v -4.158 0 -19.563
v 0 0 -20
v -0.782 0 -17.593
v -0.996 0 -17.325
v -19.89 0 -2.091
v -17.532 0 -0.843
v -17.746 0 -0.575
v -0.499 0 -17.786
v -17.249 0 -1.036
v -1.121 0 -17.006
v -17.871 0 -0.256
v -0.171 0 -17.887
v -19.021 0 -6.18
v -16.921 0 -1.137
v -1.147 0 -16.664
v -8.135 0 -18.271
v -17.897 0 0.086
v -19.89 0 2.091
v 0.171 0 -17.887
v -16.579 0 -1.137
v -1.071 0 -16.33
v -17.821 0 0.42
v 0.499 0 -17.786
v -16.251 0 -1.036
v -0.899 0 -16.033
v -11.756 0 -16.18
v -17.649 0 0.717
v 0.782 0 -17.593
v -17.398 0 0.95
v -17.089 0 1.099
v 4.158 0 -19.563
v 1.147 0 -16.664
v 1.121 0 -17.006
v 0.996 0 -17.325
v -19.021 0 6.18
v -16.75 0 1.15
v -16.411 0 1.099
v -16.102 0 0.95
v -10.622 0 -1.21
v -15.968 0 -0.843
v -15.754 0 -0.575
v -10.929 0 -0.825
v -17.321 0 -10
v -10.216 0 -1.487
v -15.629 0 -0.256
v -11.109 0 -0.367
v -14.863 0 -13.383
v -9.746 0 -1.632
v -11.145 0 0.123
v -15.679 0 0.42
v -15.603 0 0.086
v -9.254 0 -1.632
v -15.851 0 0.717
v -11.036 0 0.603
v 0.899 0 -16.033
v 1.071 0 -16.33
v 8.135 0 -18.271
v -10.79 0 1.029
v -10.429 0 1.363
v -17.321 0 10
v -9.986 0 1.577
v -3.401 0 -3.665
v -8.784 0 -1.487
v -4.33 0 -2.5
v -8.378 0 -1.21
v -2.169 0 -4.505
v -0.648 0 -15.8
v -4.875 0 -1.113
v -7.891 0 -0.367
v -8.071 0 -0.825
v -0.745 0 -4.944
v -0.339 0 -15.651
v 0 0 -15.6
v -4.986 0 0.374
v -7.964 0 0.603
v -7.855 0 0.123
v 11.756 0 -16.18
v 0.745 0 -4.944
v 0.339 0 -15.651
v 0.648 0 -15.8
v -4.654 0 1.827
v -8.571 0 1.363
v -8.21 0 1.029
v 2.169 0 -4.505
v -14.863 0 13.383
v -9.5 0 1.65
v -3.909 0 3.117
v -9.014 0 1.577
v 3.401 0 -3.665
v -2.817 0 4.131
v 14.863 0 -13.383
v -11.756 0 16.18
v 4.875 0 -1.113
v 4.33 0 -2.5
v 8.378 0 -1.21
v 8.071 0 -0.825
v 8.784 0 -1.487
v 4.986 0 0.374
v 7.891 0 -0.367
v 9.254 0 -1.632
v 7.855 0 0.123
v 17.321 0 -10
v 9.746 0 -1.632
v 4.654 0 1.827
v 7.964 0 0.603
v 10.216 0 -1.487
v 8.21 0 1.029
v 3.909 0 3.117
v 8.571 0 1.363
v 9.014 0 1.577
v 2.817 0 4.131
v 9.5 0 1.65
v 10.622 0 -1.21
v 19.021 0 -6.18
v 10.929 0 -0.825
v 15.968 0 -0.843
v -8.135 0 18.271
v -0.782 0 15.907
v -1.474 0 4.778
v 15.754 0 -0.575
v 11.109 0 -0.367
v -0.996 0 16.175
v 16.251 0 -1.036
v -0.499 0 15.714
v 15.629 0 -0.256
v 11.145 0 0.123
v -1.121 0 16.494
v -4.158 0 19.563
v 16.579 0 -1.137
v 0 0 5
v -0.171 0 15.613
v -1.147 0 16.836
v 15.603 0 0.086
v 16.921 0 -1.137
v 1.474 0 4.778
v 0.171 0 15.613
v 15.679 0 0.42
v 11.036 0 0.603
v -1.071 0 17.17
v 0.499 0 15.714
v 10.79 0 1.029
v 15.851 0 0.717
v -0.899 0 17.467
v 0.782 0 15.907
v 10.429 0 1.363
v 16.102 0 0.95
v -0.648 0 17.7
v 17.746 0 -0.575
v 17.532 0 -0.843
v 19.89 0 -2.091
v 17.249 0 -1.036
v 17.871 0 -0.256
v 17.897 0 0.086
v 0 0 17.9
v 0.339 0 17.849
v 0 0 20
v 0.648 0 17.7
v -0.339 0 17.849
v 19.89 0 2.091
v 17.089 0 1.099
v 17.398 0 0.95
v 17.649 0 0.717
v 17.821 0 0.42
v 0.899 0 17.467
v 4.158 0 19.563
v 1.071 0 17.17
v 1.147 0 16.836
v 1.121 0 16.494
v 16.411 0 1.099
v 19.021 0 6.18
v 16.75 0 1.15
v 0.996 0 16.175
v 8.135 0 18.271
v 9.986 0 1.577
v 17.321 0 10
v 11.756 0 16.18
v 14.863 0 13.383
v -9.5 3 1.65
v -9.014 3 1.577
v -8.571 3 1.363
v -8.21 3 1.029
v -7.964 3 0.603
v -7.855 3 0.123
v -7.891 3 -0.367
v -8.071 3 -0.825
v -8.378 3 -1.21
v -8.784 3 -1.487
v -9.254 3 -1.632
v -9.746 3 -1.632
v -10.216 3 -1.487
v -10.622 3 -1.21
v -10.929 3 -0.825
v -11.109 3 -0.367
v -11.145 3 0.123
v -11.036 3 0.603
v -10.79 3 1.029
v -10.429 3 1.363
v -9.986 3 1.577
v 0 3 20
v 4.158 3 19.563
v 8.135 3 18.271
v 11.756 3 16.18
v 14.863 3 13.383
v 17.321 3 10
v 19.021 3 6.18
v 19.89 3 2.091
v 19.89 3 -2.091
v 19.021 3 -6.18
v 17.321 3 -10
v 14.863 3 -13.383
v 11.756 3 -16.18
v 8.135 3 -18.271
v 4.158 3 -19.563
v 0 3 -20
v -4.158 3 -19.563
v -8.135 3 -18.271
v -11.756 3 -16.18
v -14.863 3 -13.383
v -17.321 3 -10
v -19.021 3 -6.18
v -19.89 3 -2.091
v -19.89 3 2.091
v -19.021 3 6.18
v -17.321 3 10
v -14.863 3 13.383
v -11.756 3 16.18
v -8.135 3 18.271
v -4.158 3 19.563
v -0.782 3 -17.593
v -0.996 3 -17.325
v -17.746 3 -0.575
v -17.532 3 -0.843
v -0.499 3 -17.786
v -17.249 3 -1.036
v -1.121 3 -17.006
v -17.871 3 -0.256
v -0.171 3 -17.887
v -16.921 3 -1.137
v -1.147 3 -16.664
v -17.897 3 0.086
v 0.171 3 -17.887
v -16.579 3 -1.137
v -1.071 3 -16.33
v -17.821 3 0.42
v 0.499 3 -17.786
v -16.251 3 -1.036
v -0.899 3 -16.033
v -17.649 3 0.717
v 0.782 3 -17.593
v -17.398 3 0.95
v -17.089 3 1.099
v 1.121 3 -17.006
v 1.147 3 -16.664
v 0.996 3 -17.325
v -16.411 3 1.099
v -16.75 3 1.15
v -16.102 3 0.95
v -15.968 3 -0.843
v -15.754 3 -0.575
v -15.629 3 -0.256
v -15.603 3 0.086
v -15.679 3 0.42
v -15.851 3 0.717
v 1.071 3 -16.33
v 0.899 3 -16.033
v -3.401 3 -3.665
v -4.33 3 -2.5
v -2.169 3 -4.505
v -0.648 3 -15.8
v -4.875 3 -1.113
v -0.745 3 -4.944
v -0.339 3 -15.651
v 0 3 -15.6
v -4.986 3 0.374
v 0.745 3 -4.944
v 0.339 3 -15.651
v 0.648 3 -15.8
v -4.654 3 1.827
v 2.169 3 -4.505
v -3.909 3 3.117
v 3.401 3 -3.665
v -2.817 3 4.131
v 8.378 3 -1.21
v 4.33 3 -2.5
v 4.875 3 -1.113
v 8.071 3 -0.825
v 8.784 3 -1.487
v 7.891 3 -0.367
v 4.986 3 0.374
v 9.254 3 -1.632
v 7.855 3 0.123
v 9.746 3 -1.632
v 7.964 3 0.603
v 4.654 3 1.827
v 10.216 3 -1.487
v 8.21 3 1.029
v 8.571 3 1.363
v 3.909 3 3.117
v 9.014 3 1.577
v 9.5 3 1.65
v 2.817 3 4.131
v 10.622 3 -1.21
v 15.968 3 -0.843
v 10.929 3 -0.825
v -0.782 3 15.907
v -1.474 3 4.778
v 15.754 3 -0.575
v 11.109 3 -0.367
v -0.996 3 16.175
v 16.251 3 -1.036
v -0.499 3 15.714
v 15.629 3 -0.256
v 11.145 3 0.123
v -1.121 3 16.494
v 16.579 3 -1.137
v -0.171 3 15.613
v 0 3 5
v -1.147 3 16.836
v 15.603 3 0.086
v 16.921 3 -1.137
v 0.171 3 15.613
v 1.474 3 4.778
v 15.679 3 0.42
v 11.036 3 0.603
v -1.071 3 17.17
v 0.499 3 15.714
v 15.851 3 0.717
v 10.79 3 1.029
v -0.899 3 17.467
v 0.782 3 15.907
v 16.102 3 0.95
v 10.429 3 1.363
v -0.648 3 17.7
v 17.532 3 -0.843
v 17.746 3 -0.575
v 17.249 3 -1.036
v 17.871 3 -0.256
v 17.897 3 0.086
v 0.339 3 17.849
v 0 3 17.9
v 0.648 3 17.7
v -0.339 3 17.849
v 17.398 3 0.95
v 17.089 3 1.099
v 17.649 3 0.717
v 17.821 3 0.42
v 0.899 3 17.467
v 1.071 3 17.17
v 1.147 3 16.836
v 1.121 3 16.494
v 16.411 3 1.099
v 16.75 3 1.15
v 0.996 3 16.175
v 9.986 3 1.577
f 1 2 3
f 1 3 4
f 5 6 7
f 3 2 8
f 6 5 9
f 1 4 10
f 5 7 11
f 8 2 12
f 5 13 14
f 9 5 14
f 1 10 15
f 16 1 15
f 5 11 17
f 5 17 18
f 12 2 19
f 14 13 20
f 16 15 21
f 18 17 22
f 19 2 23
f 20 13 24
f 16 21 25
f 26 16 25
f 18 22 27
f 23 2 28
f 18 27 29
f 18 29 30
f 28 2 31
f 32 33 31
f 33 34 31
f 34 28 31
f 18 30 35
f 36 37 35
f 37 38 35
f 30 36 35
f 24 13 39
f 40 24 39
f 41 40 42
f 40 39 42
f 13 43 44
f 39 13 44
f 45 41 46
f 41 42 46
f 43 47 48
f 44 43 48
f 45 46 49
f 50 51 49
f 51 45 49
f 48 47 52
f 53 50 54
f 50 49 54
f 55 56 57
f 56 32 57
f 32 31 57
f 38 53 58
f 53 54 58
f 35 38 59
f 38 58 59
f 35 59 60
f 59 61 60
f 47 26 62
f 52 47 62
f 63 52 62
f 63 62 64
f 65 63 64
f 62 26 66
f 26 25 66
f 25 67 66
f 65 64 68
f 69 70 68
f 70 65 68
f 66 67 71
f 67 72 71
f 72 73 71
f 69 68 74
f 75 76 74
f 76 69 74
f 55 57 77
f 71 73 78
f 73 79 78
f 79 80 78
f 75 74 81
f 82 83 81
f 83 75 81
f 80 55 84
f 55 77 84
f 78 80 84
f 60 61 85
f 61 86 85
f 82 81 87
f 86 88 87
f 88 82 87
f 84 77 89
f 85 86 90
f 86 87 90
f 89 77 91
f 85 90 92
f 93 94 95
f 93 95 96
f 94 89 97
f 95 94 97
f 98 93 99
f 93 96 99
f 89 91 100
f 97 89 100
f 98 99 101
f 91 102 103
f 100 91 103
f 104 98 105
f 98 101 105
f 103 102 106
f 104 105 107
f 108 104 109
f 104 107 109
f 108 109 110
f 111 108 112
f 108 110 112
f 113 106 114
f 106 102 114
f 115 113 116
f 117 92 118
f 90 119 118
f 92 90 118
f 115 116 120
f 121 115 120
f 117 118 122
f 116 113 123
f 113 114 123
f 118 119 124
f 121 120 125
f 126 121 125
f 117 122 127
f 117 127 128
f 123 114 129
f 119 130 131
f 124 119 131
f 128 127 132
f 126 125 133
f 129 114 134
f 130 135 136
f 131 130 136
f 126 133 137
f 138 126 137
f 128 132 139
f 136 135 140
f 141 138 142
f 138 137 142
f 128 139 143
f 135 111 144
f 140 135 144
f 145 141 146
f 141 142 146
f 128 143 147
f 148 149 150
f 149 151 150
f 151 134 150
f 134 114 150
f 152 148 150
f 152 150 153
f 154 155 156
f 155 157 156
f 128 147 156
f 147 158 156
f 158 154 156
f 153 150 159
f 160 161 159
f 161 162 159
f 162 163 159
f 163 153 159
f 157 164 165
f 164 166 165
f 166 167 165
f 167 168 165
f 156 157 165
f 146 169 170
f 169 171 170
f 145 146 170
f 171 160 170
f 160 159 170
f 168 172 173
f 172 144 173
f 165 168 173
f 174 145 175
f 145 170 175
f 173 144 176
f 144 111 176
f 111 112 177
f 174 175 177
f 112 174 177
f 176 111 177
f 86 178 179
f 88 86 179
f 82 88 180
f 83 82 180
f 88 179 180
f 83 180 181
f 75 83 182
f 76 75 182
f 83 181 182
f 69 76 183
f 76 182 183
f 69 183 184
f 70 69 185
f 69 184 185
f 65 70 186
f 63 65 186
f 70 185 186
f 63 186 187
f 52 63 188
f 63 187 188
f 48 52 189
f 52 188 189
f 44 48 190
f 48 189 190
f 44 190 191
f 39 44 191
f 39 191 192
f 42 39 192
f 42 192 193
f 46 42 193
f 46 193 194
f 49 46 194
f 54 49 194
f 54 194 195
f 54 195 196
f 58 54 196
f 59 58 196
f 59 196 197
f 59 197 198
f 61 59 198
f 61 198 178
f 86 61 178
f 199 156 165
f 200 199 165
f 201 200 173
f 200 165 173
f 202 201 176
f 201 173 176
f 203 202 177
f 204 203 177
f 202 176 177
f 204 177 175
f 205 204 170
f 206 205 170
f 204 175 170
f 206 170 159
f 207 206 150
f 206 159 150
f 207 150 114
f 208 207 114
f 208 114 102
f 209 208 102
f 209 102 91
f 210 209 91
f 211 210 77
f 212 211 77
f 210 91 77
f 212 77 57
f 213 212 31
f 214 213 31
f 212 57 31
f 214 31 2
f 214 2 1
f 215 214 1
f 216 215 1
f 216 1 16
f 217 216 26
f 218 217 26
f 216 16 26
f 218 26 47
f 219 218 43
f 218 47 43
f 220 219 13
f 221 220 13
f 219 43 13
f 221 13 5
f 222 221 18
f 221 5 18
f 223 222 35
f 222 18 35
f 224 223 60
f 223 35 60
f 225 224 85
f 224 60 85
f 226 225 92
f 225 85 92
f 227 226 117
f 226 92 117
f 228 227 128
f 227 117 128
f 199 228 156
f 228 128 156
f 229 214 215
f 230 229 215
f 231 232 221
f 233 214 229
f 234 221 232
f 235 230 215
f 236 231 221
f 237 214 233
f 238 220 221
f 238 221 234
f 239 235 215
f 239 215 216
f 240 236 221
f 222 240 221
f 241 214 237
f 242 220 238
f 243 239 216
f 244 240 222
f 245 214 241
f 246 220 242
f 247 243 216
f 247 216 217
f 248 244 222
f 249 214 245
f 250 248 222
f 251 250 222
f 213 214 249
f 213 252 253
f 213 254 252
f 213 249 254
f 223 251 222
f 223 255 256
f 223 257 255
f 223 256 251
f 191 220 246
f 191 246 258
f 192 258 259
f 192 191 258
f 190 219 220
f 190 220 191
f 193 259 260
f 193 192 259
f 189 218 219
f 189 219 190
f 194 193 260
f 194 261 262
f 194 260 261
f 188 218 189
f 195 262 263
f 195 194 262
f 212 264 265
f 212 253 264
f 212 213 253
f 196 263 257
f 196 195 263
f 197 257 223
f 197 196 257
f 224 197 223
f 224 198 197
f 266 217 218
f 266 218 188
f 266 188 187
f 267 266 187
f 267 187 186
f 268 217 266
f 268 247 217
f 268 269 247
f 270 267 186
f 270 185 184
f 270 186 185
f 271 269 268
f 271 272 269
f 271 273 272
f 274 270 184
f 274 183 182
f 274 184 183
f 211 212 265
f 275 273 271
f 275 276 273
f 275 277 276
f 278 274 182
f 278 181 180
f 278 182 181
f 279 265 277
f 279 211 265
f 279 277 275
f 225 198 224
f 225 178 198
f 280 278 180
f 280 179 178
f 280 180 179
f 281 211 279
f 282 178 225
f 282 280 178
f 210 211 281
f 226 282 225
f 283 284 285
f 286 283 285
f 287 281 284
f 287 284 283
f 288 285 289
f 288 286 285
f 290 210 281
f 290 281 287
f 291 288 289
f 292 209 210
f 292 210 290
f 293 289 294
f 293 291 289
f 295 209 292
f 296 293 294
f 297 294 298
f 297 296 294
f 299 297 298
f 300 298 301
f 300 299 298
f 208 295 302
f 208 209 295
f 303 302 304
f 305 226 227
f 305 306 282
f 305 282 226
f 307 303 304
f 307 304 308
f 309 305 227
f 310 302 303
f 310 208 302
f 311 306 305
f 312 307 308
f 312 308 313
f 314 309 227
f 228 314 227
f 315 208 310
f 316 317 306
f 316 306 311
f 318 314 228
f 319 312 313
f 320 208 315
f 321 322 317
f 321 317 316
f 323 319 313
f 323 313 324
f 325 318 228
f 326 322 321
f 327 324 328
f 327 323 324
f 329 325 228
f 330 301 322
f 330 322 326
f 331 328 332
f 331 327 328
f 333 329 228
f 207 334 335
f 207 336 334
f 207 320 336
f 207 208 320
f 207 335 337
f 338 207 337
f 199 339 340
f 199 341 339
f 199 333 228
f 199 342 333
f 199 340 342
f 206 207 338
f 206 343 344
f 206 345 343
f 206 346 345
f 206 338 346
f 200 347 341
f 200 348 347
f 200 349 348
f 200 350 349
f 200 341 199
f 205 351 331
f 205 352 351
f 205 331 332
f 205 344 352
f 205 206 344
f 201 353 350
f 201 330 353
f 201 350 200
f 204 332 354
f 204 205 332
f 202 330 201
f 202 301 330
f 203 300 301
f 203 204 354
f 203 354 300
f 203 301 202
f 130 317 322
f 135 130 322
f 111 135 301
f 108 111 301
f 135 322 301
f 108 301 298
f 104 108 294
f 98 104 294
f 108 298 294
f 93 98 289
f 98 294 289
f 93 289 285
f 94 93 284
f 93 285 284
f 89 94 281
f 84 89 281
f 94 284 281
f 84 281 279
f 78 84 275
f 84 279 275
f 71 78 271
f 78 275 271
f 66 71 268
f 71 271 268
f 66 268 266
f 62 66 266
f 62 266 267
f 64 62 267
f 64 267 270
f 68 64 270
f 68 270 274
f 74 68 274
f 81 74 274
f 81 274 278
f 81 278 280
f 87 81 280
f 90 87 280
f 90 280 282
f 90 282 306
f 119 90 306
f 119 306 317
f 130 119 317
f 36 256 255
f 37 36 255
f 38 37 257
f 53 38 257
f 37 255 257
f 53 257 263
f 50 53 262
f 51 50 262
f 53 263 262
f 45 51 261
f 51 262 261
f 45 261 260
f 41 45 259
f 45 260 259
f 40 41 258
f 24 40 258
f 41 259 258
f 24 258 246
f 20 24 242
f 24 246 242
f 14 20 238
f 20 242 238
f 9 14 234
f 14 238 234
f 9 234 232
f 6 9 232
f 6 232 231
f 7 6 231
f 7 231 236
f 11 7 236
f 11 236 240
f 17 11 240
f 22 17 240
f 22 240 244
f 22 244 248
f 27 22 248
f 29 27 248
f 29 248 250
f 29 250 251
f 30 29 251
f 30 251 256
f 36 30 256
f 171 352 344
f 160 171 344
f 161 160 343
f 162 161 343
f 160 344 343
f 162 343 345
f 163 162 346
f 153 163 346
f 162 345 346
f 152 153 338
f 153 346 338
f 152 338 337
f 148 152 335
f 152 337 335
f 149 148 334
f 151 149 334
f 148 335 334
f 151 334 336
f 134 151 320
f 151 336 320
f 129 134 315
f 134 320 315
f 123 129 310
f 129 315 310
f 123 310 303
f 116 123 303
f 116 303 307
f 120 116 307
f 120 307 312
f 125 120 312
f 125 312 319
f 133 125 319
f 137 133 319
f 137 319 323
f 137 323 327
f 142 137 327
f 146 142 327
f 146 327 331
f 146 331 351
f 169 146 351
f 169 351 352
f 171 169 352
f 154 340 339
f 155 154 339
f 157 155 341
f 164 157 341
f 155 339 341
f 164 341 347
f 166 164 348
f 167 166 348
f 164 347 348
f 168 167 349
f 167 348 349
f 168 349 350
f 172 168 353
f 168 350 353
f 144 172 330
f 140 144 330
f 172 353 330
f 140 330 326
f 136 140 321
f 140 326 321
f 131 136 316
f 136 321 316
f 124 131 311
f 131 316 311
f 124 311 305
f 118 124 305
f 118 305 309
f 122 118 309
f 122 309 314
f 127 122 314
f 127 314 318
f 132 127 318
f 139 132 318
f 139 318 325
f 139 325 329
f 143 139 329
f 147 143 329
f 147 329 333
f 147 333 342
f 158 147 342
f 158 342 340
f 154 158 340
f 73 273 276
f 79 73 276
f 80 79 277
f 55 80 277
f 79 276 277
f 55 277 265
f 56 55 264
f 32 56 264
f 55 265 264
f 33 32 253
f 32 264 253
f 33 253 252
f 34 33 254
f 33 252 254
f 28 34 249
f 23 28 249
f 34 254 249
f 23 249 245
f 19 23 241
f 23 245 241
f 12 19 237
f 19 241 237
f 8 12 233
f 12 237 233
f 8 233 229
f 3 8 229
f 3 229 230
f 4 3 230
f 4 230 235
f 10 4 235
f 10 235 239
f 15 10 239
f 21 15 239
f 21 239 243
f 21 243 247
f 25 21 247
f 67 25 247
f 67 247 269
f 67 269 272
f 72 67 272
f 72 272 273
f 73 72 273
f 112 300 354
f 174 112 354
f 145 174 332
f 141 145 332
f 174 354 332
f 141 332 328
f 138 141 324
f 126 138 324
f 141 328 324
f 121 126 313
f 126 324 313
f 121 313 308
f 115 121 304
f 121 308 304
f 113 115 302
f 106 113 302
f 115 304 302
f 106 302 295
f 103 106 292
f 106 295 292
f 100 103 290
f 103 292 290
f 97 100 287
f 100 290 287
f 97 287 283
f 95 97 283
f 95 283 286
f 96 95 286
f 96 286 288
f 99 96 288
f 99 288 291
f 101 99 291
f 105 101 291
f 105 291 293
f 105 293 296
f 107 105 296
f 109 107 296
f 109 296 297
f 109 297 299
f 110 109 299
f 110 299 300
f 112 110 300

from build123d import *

# Parameters (mm, degrees)
SKETCH_1_R          = 20
EXTRUDE_1_DEPTH     = 3
CUT_EXTRUDE_1_REACH = 30.443
SKETCH_2_R          = 1.15
CUT_EXTRUDE_2_REACH = 30.443
SKETCH_3_R          = 1.65
SKETCH_3_R_2        = 5


with BuildPart() as part:
    # 草图1 → 凸台-拉伸1 (new body)
    with BuildSketch(Plane(origin=(0, 0, 0), x_dir=(1, 0, 0), z_dir=(0, 1, 0))):
        with Locations(Location((0, 0, 0), (0, 0, 270))):
            Circle(SKETCH_1_R)
    extrude(amount=EXTRUDE_1_DEPTH)

    # 草图2 → 切除-拉伸1 (cut, up to next)
    with BuildSketch(Plane(origin=(0, 3, 0), x_dir=(1, 0, 0), z_dir=(0, 1, 0)), mode=Mode.PRIVATE) as cut_extrude_1_sk1:
        with Locations(Location((0, 16.75, 0), (0, 0, 270))):
            Circle(SKETCH_2_R)
    cut_extrude_1_tool1 = extrude(cut_extrude_1_sk1.sketch, amount=-CUT_EXTRUDE_1_REACH, mode=Mode.PRIVATE) & part.part
    # 草图2 → 切除-拉伸1 (cut, up to next)
    with BuildSketch(Plane(origin=(0, 3, 0), x_dir=(1, 0, 0), z_dir=(0, 1, 0)), mode=Mode.PRIVATE) as cut_extrude_1_sk2:
        with Locations(Location((16.75, 0, 0), (0, 0, 270))):
            Circle(SKETCH_2_R)
    cut_extrude_1_tool2 = extrude(cut_extrude_1_sk2.sketch, amount=-CUT_EXTRUDE_1_REACH, mode=Mode.PRIVATE) & part.part
    # 草图2 → 切除-拉伸1 (cut, up to next)
    with BuildSketch(Plane(origin=(0, 3, 0), x_dir=(1, 0, 0), z_dir=(0, 1, 0)), mode=Mode.PRIVATE) as cut_extrude_1_sk3:
        with Locations(Location((0, -16.75, 0), (0, 0, 270))):
            Circle(SKETCH_2_R)
    cut_extrude_1_tool3 = extrude(cut_extrude_1_sk3.sketch, amount=-CUT_EXTRUDE_1_REACH, mode=Mode.PRIVATE) & part.part
    # 草图2 → 切除-拉伸1 (cut, up to next)
    with BuildSketch(Plane(origin=(0, 3, 0), x_dir=(1, 0, 0), z_dir=(0, 1, 0)), mode=Mode.PRIVATE) as cut_extrude_1_sk4:
        with Locations(Location((-16.75, 0, 0), (0, 0, 270))):
            Circle(SKETCH_2_R)
    cut_extrude_1_tool4 = extrude(cut_extrude_1_sk4.sketch, amount=-CUT_EXTRUDE_1_REACH, mode=Mode.PRIVATE) & part.part
    add(cut_extrude_1_tool1.solids().sort_by_distance((0, 3, -16.75))[0], mode=Mode.SUBTRACT)
    add(cut_extrude_1_tool2.solids().sort_by_distance((16.75, 3, 0))[0], mode=Mode.SUBTRACT)
    add(cut_extrude_1_tool3.solids().sort_by_distance((0, 3, 16.75))[0], mode=Mode.SUBTRACT)
    add(cut_extrude_1_tool4.solids().sort_by_distance((-16.75, 3, 0))[0], mode=Mode.SUBTRACT)

    # 草图3 → 切除-拉伸2 (cut, up to next)
    with BuildSketch(Plane(origin=(0, 3, 0), x_dir=(1, 0, 0), z_dir=(0, 1, 0)), mode=Mode.PRIVATE) as cut_extrude_2_sk1:
        with Locations(Location((-9.5, 0, 0), (0, 0, 270))):
            Circle(SKETCH_3_R)
    cut_extrude_2_tool1 = extrude(cut_extrude_2_sk1.sketch, amount=-CUT_EXTRUDE_2_REACH, mode=Mode.PRIVATE) & part.part
    # 草图3 → 切除-拉伸2 (cut, up to next)
    with BuildSketch(Plane(origin=(0, 3, 0), x_dir=(1, 0, 0), z_dir=(0, 1, 0)), mode=Mode.PRIVATE) as cut_extrude_2_sk2:
        with Locations(Location((9.5, 0, 0), (0, 0, 270))):
            Circle(SKETCH_3_R)
    cut_extrude_2_tool2 = extrude(cut_extrude_2_sk2.sketch, amount=-CUT_EXTRUDE_2_REACH, mode=Mode.PRIVATE) & part.part
    # 草图3 → 切除-拉伸2 (cut, up to next)
    with BuildSketch(Plane(origin=(0, 3, 0), x_dir=(1, 0, 0), z_dir=(0, 1, 0)), mode=Mode.PRIVATE) as cut_extrude_2_sk3:
        with Locations(Location((0, 0, 0), (0, 0, 270))):
            Circle(SKETCH_3_R_2)
    cut_extrude_2_tool3 = extrude(cut_extrude_2_sk3.sketch, amount=-CUT_EXTRUDE_2_REACH, mode=Mode.PRIVATE) & part.part
    add(cut_extrude_2_tool1.solids().sort_by_distance((-9.5, 3, 0))[0], mode=Mode.SUBTRACT)
    add(cut_extrude_2_tool2.solids().sort_by_distance((9.5, 3, 0))[0], mode=Mode.SUBTRACT)
    add(cut_extrude_2_tool3.solids().sort_by_distance((0, 3, 0))[0], mode=Mode.SUBTRACT)


solid = part.part
